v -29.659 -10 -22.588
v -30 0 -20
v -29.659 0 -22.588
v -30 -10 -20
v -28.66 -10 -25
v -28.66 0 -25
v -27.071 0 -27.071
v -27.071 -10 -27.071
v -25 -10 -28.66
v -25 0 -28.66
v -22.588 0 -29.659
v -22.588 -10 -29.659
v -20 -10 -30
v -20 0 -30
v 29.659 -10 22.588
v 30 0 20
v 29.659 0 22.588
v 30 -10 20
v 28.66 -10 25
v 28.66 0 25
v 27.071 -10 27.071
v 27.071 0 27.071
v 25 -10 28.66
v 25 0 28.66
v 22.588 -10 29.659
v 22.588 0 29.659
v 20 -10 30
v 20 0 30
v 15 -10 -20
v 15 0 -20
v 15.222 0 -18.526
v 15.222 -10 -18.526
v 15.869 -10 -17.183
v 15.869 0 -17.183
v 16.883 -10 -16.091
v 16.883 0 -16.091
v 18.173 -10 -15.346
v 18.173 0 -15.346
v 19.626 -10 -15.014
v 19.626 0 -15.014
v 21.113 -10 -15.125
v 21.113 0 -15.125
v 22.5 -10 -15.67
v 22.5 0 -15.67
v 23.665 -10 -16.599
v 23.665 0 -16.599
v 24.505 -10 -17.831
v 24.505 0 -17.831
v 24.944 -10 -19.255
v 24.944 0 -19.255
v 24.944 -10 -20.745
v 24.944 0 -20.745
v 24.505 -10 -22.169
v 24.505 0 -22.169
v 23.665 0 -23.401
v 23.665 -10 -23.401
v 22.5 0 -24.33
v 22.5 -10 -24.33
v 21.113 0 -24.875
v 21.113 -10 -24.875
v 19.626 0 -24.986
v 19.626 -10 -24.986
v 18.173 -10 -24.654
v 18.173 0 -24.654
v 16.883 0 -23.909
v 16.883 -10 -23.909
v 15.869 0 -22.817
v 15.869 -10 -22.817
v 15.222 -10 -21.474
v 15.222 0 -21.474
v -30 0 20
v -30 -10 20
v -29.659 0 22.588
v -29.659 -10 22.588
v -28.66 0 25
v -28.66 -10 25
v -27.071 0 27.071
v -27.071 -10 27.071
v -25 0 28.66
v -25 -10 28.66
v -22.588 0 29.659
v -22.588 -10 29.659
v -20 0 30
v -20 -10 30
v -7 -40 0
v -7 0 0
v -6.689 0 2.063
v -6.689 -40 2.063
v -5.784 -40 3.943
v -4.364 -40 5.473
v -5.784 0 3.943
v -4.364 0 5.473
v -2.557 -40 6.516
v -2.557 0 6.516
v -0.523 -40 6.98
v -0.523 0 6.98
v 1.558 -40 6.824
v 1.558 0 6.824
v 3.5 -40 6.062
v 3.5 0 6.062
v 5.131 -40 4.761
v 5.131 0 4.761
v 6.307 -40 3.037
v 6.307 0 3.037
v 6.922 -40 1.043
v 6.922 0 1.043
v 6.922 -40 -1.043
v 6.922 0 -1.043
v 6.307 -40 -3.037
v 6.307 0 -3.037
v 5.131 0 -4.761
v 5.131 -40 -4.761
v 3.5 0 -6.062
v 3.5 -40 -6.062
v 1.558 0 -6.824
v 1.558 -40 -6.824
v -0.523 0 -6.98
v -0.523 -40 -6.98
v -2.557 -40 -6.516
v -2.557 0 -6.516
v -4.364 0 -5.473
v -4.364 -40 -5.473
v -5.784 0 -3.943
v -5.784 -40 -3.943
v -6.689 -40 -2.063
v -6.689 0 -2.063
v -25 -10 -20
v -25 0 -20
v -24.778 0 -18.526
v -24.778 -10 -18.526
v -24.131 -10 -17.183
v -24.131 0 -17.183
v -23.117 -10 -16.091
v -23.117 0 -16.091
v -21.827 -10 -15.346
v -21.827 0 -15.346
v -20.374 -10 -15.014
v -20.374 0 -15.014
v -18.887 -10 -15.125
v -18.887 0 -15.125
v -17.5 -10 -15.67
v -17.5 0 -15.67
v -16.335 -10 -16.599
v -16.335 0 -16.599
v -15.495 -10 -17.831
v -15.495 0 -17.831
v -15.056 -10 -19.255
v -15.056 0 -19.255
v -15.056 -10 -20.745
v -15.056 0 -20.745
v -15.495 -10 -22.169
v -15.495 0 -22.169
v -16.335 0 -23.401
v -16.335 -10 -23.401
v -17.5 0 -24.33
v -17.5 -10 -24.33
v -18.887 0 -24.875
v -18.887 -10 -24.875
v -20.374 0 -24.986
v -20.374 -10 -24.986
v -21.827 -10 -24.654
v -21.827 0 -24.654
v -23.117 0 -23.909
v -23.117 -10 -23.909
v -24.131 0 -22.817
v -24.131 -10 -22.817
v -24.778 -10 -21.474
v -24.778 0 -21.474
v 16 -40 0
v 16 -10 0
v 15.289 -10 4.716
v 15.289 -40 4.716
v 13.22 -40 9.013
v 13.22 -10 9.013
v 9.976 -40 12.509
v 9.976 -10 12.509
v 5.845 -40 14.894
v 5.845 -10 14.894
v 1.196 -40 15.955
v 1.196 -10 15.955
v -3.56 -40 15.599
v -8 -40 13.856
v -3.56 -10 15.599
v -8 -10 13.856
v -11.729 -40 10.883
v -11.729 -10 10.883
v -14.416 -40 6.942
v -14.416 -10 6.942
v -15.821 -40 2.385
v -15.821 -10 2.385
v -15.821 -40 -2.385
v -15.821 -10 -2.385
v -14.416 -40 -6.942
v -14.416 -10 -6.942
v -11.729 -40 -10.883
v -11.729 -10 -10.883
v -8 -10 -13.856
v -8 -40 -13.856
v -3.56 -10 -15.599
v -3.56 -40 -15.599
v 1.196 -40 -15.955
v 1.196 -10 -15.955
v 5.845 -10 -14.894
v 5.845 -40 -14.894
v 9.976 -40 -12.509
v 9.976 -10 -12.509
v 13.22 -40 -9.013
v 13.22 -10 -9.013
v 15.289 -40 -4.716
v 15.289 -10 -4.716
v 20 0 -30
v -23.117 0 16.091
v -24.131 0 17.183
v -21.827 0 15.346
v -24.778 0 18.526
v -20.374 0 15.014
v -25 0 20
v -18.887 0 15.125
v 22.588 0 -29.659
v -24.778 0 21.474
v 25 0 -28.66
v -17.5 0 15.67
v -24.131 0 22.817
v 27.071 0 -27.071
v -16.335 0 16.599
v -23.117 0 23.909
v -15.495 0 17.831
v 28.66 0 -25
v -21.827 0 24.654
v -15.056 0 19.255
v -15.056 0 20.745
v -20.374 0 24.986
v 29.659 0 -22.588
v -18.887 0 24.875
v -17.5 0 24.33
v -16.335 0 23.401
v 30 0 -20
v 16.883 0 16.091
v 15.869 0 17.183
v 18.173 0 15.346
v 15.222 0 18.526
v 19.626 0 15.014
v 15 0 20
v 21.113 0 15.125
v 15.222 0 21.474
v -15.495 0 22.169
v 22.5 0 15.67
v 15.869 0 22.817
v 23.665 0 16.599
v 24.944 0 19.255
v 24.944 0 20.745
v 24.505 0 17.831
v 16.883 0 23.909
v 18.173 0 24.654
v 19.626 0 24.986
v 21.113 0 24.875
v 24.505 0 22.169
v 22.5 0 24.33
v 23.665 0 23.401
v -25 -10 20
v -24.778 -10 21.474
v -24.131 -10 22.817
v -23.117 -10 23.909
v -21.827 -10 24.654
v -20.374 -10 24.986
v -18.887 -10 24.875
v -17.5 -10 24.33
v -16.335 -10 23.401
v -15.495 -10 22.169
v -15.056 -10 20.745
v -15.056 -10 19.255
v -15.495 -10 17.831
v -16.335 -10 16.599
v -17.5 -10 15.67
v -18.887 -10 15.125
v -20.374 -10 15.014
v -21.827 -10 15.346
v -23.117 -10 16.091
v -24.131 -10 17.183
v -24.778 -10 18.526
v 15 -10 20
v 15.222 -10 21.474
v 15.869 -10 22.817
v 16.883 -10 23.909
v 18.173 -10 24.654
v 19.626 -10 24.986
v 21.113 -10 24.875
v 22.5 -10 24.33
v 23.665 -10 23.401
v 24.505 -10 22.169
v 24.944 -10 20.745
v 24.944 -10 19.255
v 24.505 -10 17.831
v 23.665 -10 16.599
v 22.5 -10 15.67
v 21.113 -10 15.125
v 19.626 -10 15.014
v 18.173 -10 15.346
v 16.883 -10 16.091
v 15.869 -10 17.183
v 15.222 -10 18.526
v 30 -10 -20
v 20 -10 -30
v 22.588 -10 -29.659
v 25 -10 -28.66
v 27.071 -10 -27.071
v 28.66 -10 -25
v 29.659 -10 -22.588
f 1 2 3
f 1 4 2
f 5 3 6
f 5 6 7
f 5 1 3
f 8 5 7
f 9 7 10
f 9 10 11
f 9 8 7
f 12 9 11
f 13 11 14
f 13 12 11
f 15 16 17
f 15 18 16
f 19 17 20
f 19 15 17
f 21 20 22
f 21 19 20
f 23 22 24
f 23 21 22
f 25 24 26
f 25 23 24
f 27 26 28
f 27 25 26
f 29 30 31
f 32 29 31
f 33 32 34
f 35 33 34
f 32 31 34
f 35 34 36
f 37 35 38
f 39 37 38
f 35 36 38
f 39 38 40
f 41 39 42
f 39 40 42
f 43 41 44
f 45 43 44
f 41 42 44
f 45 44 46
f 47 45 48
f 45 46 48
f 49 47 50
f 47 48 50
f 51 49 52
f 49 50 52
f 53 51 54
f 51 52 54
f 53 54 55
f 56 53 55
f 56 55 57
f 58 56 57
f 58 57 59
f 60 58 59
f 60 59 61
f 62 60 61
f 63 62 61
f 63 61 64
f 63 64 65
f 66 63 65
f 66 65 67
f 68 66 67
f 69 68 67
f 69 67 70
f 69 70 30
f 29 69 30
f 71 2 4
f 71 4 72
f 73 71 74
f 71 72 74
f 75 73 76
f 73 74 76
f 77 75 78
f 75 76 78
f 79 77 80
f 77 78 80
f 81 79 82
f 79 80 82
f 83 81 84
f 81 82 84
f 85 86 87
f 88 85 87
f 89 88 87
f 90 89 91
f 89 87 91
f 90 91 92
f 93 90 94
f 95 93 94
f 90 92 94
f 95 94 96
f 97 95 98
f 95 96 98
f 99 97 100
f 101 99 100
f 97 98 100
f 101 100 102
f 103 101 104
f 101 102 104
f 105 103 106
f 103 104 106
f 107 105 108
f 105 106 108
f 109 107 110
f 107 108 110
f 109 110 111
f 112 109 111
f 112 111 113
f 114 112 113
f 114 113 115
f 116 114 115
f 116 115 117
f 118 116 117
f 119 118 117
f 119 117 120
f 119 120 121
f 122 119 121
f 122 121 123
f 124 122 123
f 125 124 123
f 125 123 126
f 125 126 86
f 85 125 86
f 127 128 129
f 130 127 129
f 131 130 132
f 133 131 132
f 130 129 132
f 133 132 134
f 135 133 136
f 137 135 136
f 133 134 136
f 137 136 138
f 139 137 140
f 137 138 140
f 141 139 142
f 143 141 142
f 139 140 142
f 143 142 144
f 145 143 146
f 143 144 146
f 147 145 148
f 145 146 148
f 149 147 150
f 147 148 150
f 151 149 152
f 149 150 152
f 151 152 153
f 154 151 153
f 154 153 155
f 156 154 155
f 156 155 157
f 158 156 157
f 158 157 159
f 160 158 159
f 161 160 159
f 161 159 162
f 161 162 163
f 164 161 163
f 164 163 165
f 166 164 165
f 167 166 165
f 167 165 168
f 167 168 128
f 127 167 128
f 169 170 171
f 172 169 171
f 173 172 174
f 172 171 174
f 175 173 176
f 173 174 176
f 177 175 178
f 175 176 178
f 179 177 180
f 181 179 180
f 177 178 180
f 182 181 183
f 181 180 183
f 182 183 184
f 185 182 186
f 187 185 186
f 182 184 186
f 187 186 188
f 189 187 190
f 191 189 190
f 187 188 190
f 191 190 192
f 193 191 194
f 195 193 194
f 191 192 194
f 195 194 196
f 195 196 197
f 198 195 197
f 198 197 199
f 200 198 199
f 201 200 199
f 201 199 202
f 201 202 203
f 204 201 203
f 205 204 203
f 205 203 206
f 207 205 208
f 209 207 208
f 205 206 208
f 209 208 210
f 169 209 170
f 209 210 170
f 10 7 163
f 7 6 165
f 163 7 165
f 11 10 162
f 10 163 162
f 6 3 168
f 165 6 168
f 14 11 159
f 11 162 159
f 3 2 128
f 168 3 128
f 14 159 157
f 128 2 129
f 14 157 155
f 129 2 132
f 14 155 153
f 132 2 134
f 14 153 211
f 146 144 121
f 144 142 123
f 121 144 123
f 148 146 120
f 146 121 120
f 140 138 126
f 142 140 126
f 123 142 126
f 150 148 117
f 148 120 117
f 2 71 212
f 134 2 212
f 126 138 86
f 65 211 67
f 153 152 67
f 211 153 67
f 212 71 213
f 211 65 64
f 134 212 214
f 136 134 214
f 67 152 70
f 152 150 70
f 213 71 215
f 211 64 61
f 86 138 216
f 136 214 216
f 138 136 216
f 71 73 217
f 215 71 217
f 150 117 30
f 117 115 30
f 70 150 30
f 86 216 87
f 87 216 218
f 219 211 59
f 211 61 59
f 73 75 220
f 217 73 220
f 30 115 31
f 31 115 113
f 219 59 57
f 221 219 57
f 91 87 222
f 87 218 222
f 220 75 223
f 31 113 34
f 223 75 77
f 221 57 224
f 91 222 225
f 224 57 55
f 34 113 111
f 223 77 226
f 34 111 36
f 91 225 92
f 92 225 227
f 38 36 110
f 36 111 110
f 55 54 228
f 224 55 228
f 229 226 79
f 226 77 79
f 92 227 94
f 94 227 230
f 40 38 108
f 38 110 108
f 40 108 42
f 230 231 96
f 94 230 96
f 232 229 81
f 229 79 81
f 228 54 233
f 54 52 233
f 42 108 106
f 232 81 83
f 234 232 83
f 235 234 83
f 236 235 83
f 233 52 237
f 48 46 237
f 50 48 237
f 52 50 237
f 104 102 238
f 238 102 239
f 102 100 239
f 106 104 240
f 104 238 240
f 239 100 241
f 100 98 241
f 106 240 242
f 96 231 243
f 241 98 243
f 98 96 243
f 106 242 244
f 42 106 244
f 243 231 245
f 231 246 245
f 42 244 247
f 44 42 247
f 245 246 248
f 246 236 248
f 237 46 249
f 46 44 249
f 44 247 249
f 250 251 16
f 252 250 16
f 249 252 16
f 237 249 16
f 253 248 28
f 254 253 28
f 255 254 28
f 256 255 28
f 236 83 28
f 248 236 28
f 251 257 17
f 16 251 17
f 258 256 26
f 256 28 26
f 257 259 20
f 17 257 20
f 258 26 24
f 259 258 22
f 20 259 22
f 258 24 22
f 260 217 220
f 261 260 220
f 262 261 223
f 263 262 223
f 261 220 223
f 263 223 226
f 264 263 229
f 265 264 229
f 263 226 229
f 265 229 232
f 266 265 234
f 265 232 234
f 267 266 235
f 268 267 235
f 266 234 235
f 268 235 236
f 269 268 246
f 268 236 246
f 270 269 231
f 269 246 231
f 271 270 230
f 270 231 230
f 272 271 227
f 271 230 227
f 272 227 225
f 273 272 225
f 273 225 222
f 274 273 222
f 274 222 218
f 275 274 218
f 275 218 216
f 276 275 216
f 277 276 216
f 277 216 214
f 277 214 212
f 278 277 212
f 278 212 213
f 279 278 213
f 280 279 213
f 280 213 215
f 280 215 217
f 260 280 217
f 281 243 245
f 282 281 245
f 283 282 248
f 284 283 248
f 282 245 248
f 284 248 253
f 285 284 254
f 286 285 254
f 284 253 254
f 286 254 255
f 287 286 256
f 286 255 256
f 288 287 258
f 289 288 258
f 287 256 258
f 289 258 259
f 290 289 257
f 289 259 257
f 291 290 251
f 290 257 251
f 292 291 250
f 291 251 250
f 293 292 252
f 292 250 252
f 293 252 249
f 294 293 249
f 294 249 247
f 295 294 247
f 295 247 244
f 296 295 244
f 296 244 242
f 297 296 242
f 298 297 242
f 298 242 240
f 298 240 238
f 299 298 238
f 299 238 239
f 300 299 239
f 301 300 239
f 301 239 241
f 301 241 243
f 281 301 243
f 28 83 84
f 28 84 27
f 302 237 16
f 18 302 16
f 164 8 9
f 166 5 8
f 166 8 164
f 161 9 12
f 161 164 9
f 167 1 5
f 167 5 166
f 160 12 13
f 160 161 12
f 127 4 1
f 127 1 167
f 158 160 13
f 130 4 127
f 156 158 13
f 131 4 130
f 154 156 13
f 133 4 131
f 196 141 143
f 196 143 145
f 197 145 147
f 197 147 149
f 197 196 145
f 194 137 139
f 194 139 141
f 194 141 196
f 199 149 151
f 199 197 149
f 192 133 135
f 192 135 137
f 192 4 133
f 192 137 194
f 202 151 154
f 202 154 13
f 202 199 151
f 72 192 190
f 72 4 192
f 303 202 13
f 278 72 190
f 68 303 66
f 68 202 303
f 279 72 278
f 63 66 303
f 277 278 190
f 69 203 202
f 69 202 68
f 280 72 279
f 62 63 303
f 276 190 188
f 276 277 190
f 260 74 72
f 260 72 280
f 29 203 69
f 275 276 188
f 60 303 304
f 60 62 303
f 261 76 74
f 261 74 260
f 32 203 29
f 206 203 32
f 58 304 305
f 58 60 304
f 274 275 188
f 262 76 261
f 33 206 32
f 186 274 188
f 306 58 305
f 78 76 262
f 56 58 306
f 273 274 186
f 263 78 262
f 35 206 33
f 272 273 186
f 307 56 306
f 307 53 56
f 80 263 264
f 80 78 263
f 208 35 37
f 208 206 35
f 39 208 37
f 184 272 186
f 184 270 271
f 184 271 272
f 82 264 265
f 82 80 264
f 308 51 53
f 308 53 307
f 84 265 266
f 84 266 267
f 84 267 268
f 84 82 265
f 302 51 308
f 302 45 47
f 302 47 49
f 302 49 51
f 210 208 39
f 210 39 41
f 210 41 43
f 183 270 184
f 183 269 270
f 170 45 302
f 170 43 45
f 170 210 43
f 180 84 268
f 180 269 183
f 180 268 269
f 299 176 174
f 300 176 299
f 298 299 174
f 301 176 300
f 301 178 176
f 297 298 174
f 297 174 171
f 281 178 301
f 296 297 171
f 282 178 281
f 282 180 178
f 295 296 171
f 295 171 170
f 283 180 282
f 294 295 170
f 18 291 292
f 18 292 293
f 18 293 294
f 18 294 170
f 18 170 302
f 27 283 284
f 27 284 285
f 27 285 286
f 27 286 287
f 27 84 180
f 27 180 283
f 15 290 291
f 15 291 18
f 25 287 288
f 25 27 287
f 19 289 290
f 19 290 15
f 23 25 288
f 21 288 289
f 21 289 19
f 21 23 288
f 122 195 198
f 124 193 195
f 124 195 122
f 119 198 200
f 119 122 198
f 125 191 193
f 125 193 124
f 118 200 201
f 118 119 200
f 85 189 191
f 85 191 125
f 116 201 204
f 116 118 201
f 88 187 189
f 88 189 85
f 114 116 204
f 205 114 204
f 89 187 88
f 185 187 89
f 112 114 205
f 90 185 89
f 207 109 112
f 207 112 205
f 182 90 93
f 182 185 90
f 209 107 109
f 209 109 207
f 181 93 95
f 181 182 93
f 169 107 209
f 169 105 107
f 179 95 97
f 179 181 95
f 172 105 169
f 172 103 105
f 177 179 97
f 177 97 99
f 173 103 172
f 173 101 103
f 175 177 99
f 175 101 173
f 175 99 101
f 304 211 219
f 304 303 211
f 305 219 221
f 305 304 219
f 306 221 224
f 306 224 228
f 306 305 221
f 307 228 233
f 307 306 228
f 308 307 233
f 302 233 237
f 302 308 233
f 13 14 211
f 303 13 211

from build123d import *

# Parameters (mm, degrees)
F0_W     = 60
F0_H     = 60
F1_DEPTH = 10
F2_R     = 10
F3_R     = 16
F4_DEPTH = 30
F6_D     = 14
F8_D     = 10


with BuildPart() as f1:
    # F0 (on Front) → F1 (new body)
    with BuildSketch(Plane.XZ):
        Rectangle(F0_W, F0_H)
    extrude(amount=F1_DEPTH)

    # F2
    f2_edges = [f1.edges().sort_by_distance(p)[0] for p in [
        (30, -5, 30),
        (-30, -5, 30),
        (30, -5, -30),
        (-30, -5, -30),
    ]]
    fillet(f2_edges, radius=F2_R)

    # F3 (on face) → F4 (join)
    with BuildSketch(Plane.XZ.offset(10)):
        Circle(F3_R)
    extrude(amount=F4_DEPTH)

    # F6 (through all)
    with Locations(Plane.XZ.offset(40)):
        with Locations((0, 0)):
            Hole(F6_D / 2)

    # F8 (through all)
    with Locations(Plane.XZ.offset(40)):
        with Locations((-20, 20), (20, 20), (20, -20), (-20, -20)):
            Hole(F8_D / 2)


solid = f1.part
